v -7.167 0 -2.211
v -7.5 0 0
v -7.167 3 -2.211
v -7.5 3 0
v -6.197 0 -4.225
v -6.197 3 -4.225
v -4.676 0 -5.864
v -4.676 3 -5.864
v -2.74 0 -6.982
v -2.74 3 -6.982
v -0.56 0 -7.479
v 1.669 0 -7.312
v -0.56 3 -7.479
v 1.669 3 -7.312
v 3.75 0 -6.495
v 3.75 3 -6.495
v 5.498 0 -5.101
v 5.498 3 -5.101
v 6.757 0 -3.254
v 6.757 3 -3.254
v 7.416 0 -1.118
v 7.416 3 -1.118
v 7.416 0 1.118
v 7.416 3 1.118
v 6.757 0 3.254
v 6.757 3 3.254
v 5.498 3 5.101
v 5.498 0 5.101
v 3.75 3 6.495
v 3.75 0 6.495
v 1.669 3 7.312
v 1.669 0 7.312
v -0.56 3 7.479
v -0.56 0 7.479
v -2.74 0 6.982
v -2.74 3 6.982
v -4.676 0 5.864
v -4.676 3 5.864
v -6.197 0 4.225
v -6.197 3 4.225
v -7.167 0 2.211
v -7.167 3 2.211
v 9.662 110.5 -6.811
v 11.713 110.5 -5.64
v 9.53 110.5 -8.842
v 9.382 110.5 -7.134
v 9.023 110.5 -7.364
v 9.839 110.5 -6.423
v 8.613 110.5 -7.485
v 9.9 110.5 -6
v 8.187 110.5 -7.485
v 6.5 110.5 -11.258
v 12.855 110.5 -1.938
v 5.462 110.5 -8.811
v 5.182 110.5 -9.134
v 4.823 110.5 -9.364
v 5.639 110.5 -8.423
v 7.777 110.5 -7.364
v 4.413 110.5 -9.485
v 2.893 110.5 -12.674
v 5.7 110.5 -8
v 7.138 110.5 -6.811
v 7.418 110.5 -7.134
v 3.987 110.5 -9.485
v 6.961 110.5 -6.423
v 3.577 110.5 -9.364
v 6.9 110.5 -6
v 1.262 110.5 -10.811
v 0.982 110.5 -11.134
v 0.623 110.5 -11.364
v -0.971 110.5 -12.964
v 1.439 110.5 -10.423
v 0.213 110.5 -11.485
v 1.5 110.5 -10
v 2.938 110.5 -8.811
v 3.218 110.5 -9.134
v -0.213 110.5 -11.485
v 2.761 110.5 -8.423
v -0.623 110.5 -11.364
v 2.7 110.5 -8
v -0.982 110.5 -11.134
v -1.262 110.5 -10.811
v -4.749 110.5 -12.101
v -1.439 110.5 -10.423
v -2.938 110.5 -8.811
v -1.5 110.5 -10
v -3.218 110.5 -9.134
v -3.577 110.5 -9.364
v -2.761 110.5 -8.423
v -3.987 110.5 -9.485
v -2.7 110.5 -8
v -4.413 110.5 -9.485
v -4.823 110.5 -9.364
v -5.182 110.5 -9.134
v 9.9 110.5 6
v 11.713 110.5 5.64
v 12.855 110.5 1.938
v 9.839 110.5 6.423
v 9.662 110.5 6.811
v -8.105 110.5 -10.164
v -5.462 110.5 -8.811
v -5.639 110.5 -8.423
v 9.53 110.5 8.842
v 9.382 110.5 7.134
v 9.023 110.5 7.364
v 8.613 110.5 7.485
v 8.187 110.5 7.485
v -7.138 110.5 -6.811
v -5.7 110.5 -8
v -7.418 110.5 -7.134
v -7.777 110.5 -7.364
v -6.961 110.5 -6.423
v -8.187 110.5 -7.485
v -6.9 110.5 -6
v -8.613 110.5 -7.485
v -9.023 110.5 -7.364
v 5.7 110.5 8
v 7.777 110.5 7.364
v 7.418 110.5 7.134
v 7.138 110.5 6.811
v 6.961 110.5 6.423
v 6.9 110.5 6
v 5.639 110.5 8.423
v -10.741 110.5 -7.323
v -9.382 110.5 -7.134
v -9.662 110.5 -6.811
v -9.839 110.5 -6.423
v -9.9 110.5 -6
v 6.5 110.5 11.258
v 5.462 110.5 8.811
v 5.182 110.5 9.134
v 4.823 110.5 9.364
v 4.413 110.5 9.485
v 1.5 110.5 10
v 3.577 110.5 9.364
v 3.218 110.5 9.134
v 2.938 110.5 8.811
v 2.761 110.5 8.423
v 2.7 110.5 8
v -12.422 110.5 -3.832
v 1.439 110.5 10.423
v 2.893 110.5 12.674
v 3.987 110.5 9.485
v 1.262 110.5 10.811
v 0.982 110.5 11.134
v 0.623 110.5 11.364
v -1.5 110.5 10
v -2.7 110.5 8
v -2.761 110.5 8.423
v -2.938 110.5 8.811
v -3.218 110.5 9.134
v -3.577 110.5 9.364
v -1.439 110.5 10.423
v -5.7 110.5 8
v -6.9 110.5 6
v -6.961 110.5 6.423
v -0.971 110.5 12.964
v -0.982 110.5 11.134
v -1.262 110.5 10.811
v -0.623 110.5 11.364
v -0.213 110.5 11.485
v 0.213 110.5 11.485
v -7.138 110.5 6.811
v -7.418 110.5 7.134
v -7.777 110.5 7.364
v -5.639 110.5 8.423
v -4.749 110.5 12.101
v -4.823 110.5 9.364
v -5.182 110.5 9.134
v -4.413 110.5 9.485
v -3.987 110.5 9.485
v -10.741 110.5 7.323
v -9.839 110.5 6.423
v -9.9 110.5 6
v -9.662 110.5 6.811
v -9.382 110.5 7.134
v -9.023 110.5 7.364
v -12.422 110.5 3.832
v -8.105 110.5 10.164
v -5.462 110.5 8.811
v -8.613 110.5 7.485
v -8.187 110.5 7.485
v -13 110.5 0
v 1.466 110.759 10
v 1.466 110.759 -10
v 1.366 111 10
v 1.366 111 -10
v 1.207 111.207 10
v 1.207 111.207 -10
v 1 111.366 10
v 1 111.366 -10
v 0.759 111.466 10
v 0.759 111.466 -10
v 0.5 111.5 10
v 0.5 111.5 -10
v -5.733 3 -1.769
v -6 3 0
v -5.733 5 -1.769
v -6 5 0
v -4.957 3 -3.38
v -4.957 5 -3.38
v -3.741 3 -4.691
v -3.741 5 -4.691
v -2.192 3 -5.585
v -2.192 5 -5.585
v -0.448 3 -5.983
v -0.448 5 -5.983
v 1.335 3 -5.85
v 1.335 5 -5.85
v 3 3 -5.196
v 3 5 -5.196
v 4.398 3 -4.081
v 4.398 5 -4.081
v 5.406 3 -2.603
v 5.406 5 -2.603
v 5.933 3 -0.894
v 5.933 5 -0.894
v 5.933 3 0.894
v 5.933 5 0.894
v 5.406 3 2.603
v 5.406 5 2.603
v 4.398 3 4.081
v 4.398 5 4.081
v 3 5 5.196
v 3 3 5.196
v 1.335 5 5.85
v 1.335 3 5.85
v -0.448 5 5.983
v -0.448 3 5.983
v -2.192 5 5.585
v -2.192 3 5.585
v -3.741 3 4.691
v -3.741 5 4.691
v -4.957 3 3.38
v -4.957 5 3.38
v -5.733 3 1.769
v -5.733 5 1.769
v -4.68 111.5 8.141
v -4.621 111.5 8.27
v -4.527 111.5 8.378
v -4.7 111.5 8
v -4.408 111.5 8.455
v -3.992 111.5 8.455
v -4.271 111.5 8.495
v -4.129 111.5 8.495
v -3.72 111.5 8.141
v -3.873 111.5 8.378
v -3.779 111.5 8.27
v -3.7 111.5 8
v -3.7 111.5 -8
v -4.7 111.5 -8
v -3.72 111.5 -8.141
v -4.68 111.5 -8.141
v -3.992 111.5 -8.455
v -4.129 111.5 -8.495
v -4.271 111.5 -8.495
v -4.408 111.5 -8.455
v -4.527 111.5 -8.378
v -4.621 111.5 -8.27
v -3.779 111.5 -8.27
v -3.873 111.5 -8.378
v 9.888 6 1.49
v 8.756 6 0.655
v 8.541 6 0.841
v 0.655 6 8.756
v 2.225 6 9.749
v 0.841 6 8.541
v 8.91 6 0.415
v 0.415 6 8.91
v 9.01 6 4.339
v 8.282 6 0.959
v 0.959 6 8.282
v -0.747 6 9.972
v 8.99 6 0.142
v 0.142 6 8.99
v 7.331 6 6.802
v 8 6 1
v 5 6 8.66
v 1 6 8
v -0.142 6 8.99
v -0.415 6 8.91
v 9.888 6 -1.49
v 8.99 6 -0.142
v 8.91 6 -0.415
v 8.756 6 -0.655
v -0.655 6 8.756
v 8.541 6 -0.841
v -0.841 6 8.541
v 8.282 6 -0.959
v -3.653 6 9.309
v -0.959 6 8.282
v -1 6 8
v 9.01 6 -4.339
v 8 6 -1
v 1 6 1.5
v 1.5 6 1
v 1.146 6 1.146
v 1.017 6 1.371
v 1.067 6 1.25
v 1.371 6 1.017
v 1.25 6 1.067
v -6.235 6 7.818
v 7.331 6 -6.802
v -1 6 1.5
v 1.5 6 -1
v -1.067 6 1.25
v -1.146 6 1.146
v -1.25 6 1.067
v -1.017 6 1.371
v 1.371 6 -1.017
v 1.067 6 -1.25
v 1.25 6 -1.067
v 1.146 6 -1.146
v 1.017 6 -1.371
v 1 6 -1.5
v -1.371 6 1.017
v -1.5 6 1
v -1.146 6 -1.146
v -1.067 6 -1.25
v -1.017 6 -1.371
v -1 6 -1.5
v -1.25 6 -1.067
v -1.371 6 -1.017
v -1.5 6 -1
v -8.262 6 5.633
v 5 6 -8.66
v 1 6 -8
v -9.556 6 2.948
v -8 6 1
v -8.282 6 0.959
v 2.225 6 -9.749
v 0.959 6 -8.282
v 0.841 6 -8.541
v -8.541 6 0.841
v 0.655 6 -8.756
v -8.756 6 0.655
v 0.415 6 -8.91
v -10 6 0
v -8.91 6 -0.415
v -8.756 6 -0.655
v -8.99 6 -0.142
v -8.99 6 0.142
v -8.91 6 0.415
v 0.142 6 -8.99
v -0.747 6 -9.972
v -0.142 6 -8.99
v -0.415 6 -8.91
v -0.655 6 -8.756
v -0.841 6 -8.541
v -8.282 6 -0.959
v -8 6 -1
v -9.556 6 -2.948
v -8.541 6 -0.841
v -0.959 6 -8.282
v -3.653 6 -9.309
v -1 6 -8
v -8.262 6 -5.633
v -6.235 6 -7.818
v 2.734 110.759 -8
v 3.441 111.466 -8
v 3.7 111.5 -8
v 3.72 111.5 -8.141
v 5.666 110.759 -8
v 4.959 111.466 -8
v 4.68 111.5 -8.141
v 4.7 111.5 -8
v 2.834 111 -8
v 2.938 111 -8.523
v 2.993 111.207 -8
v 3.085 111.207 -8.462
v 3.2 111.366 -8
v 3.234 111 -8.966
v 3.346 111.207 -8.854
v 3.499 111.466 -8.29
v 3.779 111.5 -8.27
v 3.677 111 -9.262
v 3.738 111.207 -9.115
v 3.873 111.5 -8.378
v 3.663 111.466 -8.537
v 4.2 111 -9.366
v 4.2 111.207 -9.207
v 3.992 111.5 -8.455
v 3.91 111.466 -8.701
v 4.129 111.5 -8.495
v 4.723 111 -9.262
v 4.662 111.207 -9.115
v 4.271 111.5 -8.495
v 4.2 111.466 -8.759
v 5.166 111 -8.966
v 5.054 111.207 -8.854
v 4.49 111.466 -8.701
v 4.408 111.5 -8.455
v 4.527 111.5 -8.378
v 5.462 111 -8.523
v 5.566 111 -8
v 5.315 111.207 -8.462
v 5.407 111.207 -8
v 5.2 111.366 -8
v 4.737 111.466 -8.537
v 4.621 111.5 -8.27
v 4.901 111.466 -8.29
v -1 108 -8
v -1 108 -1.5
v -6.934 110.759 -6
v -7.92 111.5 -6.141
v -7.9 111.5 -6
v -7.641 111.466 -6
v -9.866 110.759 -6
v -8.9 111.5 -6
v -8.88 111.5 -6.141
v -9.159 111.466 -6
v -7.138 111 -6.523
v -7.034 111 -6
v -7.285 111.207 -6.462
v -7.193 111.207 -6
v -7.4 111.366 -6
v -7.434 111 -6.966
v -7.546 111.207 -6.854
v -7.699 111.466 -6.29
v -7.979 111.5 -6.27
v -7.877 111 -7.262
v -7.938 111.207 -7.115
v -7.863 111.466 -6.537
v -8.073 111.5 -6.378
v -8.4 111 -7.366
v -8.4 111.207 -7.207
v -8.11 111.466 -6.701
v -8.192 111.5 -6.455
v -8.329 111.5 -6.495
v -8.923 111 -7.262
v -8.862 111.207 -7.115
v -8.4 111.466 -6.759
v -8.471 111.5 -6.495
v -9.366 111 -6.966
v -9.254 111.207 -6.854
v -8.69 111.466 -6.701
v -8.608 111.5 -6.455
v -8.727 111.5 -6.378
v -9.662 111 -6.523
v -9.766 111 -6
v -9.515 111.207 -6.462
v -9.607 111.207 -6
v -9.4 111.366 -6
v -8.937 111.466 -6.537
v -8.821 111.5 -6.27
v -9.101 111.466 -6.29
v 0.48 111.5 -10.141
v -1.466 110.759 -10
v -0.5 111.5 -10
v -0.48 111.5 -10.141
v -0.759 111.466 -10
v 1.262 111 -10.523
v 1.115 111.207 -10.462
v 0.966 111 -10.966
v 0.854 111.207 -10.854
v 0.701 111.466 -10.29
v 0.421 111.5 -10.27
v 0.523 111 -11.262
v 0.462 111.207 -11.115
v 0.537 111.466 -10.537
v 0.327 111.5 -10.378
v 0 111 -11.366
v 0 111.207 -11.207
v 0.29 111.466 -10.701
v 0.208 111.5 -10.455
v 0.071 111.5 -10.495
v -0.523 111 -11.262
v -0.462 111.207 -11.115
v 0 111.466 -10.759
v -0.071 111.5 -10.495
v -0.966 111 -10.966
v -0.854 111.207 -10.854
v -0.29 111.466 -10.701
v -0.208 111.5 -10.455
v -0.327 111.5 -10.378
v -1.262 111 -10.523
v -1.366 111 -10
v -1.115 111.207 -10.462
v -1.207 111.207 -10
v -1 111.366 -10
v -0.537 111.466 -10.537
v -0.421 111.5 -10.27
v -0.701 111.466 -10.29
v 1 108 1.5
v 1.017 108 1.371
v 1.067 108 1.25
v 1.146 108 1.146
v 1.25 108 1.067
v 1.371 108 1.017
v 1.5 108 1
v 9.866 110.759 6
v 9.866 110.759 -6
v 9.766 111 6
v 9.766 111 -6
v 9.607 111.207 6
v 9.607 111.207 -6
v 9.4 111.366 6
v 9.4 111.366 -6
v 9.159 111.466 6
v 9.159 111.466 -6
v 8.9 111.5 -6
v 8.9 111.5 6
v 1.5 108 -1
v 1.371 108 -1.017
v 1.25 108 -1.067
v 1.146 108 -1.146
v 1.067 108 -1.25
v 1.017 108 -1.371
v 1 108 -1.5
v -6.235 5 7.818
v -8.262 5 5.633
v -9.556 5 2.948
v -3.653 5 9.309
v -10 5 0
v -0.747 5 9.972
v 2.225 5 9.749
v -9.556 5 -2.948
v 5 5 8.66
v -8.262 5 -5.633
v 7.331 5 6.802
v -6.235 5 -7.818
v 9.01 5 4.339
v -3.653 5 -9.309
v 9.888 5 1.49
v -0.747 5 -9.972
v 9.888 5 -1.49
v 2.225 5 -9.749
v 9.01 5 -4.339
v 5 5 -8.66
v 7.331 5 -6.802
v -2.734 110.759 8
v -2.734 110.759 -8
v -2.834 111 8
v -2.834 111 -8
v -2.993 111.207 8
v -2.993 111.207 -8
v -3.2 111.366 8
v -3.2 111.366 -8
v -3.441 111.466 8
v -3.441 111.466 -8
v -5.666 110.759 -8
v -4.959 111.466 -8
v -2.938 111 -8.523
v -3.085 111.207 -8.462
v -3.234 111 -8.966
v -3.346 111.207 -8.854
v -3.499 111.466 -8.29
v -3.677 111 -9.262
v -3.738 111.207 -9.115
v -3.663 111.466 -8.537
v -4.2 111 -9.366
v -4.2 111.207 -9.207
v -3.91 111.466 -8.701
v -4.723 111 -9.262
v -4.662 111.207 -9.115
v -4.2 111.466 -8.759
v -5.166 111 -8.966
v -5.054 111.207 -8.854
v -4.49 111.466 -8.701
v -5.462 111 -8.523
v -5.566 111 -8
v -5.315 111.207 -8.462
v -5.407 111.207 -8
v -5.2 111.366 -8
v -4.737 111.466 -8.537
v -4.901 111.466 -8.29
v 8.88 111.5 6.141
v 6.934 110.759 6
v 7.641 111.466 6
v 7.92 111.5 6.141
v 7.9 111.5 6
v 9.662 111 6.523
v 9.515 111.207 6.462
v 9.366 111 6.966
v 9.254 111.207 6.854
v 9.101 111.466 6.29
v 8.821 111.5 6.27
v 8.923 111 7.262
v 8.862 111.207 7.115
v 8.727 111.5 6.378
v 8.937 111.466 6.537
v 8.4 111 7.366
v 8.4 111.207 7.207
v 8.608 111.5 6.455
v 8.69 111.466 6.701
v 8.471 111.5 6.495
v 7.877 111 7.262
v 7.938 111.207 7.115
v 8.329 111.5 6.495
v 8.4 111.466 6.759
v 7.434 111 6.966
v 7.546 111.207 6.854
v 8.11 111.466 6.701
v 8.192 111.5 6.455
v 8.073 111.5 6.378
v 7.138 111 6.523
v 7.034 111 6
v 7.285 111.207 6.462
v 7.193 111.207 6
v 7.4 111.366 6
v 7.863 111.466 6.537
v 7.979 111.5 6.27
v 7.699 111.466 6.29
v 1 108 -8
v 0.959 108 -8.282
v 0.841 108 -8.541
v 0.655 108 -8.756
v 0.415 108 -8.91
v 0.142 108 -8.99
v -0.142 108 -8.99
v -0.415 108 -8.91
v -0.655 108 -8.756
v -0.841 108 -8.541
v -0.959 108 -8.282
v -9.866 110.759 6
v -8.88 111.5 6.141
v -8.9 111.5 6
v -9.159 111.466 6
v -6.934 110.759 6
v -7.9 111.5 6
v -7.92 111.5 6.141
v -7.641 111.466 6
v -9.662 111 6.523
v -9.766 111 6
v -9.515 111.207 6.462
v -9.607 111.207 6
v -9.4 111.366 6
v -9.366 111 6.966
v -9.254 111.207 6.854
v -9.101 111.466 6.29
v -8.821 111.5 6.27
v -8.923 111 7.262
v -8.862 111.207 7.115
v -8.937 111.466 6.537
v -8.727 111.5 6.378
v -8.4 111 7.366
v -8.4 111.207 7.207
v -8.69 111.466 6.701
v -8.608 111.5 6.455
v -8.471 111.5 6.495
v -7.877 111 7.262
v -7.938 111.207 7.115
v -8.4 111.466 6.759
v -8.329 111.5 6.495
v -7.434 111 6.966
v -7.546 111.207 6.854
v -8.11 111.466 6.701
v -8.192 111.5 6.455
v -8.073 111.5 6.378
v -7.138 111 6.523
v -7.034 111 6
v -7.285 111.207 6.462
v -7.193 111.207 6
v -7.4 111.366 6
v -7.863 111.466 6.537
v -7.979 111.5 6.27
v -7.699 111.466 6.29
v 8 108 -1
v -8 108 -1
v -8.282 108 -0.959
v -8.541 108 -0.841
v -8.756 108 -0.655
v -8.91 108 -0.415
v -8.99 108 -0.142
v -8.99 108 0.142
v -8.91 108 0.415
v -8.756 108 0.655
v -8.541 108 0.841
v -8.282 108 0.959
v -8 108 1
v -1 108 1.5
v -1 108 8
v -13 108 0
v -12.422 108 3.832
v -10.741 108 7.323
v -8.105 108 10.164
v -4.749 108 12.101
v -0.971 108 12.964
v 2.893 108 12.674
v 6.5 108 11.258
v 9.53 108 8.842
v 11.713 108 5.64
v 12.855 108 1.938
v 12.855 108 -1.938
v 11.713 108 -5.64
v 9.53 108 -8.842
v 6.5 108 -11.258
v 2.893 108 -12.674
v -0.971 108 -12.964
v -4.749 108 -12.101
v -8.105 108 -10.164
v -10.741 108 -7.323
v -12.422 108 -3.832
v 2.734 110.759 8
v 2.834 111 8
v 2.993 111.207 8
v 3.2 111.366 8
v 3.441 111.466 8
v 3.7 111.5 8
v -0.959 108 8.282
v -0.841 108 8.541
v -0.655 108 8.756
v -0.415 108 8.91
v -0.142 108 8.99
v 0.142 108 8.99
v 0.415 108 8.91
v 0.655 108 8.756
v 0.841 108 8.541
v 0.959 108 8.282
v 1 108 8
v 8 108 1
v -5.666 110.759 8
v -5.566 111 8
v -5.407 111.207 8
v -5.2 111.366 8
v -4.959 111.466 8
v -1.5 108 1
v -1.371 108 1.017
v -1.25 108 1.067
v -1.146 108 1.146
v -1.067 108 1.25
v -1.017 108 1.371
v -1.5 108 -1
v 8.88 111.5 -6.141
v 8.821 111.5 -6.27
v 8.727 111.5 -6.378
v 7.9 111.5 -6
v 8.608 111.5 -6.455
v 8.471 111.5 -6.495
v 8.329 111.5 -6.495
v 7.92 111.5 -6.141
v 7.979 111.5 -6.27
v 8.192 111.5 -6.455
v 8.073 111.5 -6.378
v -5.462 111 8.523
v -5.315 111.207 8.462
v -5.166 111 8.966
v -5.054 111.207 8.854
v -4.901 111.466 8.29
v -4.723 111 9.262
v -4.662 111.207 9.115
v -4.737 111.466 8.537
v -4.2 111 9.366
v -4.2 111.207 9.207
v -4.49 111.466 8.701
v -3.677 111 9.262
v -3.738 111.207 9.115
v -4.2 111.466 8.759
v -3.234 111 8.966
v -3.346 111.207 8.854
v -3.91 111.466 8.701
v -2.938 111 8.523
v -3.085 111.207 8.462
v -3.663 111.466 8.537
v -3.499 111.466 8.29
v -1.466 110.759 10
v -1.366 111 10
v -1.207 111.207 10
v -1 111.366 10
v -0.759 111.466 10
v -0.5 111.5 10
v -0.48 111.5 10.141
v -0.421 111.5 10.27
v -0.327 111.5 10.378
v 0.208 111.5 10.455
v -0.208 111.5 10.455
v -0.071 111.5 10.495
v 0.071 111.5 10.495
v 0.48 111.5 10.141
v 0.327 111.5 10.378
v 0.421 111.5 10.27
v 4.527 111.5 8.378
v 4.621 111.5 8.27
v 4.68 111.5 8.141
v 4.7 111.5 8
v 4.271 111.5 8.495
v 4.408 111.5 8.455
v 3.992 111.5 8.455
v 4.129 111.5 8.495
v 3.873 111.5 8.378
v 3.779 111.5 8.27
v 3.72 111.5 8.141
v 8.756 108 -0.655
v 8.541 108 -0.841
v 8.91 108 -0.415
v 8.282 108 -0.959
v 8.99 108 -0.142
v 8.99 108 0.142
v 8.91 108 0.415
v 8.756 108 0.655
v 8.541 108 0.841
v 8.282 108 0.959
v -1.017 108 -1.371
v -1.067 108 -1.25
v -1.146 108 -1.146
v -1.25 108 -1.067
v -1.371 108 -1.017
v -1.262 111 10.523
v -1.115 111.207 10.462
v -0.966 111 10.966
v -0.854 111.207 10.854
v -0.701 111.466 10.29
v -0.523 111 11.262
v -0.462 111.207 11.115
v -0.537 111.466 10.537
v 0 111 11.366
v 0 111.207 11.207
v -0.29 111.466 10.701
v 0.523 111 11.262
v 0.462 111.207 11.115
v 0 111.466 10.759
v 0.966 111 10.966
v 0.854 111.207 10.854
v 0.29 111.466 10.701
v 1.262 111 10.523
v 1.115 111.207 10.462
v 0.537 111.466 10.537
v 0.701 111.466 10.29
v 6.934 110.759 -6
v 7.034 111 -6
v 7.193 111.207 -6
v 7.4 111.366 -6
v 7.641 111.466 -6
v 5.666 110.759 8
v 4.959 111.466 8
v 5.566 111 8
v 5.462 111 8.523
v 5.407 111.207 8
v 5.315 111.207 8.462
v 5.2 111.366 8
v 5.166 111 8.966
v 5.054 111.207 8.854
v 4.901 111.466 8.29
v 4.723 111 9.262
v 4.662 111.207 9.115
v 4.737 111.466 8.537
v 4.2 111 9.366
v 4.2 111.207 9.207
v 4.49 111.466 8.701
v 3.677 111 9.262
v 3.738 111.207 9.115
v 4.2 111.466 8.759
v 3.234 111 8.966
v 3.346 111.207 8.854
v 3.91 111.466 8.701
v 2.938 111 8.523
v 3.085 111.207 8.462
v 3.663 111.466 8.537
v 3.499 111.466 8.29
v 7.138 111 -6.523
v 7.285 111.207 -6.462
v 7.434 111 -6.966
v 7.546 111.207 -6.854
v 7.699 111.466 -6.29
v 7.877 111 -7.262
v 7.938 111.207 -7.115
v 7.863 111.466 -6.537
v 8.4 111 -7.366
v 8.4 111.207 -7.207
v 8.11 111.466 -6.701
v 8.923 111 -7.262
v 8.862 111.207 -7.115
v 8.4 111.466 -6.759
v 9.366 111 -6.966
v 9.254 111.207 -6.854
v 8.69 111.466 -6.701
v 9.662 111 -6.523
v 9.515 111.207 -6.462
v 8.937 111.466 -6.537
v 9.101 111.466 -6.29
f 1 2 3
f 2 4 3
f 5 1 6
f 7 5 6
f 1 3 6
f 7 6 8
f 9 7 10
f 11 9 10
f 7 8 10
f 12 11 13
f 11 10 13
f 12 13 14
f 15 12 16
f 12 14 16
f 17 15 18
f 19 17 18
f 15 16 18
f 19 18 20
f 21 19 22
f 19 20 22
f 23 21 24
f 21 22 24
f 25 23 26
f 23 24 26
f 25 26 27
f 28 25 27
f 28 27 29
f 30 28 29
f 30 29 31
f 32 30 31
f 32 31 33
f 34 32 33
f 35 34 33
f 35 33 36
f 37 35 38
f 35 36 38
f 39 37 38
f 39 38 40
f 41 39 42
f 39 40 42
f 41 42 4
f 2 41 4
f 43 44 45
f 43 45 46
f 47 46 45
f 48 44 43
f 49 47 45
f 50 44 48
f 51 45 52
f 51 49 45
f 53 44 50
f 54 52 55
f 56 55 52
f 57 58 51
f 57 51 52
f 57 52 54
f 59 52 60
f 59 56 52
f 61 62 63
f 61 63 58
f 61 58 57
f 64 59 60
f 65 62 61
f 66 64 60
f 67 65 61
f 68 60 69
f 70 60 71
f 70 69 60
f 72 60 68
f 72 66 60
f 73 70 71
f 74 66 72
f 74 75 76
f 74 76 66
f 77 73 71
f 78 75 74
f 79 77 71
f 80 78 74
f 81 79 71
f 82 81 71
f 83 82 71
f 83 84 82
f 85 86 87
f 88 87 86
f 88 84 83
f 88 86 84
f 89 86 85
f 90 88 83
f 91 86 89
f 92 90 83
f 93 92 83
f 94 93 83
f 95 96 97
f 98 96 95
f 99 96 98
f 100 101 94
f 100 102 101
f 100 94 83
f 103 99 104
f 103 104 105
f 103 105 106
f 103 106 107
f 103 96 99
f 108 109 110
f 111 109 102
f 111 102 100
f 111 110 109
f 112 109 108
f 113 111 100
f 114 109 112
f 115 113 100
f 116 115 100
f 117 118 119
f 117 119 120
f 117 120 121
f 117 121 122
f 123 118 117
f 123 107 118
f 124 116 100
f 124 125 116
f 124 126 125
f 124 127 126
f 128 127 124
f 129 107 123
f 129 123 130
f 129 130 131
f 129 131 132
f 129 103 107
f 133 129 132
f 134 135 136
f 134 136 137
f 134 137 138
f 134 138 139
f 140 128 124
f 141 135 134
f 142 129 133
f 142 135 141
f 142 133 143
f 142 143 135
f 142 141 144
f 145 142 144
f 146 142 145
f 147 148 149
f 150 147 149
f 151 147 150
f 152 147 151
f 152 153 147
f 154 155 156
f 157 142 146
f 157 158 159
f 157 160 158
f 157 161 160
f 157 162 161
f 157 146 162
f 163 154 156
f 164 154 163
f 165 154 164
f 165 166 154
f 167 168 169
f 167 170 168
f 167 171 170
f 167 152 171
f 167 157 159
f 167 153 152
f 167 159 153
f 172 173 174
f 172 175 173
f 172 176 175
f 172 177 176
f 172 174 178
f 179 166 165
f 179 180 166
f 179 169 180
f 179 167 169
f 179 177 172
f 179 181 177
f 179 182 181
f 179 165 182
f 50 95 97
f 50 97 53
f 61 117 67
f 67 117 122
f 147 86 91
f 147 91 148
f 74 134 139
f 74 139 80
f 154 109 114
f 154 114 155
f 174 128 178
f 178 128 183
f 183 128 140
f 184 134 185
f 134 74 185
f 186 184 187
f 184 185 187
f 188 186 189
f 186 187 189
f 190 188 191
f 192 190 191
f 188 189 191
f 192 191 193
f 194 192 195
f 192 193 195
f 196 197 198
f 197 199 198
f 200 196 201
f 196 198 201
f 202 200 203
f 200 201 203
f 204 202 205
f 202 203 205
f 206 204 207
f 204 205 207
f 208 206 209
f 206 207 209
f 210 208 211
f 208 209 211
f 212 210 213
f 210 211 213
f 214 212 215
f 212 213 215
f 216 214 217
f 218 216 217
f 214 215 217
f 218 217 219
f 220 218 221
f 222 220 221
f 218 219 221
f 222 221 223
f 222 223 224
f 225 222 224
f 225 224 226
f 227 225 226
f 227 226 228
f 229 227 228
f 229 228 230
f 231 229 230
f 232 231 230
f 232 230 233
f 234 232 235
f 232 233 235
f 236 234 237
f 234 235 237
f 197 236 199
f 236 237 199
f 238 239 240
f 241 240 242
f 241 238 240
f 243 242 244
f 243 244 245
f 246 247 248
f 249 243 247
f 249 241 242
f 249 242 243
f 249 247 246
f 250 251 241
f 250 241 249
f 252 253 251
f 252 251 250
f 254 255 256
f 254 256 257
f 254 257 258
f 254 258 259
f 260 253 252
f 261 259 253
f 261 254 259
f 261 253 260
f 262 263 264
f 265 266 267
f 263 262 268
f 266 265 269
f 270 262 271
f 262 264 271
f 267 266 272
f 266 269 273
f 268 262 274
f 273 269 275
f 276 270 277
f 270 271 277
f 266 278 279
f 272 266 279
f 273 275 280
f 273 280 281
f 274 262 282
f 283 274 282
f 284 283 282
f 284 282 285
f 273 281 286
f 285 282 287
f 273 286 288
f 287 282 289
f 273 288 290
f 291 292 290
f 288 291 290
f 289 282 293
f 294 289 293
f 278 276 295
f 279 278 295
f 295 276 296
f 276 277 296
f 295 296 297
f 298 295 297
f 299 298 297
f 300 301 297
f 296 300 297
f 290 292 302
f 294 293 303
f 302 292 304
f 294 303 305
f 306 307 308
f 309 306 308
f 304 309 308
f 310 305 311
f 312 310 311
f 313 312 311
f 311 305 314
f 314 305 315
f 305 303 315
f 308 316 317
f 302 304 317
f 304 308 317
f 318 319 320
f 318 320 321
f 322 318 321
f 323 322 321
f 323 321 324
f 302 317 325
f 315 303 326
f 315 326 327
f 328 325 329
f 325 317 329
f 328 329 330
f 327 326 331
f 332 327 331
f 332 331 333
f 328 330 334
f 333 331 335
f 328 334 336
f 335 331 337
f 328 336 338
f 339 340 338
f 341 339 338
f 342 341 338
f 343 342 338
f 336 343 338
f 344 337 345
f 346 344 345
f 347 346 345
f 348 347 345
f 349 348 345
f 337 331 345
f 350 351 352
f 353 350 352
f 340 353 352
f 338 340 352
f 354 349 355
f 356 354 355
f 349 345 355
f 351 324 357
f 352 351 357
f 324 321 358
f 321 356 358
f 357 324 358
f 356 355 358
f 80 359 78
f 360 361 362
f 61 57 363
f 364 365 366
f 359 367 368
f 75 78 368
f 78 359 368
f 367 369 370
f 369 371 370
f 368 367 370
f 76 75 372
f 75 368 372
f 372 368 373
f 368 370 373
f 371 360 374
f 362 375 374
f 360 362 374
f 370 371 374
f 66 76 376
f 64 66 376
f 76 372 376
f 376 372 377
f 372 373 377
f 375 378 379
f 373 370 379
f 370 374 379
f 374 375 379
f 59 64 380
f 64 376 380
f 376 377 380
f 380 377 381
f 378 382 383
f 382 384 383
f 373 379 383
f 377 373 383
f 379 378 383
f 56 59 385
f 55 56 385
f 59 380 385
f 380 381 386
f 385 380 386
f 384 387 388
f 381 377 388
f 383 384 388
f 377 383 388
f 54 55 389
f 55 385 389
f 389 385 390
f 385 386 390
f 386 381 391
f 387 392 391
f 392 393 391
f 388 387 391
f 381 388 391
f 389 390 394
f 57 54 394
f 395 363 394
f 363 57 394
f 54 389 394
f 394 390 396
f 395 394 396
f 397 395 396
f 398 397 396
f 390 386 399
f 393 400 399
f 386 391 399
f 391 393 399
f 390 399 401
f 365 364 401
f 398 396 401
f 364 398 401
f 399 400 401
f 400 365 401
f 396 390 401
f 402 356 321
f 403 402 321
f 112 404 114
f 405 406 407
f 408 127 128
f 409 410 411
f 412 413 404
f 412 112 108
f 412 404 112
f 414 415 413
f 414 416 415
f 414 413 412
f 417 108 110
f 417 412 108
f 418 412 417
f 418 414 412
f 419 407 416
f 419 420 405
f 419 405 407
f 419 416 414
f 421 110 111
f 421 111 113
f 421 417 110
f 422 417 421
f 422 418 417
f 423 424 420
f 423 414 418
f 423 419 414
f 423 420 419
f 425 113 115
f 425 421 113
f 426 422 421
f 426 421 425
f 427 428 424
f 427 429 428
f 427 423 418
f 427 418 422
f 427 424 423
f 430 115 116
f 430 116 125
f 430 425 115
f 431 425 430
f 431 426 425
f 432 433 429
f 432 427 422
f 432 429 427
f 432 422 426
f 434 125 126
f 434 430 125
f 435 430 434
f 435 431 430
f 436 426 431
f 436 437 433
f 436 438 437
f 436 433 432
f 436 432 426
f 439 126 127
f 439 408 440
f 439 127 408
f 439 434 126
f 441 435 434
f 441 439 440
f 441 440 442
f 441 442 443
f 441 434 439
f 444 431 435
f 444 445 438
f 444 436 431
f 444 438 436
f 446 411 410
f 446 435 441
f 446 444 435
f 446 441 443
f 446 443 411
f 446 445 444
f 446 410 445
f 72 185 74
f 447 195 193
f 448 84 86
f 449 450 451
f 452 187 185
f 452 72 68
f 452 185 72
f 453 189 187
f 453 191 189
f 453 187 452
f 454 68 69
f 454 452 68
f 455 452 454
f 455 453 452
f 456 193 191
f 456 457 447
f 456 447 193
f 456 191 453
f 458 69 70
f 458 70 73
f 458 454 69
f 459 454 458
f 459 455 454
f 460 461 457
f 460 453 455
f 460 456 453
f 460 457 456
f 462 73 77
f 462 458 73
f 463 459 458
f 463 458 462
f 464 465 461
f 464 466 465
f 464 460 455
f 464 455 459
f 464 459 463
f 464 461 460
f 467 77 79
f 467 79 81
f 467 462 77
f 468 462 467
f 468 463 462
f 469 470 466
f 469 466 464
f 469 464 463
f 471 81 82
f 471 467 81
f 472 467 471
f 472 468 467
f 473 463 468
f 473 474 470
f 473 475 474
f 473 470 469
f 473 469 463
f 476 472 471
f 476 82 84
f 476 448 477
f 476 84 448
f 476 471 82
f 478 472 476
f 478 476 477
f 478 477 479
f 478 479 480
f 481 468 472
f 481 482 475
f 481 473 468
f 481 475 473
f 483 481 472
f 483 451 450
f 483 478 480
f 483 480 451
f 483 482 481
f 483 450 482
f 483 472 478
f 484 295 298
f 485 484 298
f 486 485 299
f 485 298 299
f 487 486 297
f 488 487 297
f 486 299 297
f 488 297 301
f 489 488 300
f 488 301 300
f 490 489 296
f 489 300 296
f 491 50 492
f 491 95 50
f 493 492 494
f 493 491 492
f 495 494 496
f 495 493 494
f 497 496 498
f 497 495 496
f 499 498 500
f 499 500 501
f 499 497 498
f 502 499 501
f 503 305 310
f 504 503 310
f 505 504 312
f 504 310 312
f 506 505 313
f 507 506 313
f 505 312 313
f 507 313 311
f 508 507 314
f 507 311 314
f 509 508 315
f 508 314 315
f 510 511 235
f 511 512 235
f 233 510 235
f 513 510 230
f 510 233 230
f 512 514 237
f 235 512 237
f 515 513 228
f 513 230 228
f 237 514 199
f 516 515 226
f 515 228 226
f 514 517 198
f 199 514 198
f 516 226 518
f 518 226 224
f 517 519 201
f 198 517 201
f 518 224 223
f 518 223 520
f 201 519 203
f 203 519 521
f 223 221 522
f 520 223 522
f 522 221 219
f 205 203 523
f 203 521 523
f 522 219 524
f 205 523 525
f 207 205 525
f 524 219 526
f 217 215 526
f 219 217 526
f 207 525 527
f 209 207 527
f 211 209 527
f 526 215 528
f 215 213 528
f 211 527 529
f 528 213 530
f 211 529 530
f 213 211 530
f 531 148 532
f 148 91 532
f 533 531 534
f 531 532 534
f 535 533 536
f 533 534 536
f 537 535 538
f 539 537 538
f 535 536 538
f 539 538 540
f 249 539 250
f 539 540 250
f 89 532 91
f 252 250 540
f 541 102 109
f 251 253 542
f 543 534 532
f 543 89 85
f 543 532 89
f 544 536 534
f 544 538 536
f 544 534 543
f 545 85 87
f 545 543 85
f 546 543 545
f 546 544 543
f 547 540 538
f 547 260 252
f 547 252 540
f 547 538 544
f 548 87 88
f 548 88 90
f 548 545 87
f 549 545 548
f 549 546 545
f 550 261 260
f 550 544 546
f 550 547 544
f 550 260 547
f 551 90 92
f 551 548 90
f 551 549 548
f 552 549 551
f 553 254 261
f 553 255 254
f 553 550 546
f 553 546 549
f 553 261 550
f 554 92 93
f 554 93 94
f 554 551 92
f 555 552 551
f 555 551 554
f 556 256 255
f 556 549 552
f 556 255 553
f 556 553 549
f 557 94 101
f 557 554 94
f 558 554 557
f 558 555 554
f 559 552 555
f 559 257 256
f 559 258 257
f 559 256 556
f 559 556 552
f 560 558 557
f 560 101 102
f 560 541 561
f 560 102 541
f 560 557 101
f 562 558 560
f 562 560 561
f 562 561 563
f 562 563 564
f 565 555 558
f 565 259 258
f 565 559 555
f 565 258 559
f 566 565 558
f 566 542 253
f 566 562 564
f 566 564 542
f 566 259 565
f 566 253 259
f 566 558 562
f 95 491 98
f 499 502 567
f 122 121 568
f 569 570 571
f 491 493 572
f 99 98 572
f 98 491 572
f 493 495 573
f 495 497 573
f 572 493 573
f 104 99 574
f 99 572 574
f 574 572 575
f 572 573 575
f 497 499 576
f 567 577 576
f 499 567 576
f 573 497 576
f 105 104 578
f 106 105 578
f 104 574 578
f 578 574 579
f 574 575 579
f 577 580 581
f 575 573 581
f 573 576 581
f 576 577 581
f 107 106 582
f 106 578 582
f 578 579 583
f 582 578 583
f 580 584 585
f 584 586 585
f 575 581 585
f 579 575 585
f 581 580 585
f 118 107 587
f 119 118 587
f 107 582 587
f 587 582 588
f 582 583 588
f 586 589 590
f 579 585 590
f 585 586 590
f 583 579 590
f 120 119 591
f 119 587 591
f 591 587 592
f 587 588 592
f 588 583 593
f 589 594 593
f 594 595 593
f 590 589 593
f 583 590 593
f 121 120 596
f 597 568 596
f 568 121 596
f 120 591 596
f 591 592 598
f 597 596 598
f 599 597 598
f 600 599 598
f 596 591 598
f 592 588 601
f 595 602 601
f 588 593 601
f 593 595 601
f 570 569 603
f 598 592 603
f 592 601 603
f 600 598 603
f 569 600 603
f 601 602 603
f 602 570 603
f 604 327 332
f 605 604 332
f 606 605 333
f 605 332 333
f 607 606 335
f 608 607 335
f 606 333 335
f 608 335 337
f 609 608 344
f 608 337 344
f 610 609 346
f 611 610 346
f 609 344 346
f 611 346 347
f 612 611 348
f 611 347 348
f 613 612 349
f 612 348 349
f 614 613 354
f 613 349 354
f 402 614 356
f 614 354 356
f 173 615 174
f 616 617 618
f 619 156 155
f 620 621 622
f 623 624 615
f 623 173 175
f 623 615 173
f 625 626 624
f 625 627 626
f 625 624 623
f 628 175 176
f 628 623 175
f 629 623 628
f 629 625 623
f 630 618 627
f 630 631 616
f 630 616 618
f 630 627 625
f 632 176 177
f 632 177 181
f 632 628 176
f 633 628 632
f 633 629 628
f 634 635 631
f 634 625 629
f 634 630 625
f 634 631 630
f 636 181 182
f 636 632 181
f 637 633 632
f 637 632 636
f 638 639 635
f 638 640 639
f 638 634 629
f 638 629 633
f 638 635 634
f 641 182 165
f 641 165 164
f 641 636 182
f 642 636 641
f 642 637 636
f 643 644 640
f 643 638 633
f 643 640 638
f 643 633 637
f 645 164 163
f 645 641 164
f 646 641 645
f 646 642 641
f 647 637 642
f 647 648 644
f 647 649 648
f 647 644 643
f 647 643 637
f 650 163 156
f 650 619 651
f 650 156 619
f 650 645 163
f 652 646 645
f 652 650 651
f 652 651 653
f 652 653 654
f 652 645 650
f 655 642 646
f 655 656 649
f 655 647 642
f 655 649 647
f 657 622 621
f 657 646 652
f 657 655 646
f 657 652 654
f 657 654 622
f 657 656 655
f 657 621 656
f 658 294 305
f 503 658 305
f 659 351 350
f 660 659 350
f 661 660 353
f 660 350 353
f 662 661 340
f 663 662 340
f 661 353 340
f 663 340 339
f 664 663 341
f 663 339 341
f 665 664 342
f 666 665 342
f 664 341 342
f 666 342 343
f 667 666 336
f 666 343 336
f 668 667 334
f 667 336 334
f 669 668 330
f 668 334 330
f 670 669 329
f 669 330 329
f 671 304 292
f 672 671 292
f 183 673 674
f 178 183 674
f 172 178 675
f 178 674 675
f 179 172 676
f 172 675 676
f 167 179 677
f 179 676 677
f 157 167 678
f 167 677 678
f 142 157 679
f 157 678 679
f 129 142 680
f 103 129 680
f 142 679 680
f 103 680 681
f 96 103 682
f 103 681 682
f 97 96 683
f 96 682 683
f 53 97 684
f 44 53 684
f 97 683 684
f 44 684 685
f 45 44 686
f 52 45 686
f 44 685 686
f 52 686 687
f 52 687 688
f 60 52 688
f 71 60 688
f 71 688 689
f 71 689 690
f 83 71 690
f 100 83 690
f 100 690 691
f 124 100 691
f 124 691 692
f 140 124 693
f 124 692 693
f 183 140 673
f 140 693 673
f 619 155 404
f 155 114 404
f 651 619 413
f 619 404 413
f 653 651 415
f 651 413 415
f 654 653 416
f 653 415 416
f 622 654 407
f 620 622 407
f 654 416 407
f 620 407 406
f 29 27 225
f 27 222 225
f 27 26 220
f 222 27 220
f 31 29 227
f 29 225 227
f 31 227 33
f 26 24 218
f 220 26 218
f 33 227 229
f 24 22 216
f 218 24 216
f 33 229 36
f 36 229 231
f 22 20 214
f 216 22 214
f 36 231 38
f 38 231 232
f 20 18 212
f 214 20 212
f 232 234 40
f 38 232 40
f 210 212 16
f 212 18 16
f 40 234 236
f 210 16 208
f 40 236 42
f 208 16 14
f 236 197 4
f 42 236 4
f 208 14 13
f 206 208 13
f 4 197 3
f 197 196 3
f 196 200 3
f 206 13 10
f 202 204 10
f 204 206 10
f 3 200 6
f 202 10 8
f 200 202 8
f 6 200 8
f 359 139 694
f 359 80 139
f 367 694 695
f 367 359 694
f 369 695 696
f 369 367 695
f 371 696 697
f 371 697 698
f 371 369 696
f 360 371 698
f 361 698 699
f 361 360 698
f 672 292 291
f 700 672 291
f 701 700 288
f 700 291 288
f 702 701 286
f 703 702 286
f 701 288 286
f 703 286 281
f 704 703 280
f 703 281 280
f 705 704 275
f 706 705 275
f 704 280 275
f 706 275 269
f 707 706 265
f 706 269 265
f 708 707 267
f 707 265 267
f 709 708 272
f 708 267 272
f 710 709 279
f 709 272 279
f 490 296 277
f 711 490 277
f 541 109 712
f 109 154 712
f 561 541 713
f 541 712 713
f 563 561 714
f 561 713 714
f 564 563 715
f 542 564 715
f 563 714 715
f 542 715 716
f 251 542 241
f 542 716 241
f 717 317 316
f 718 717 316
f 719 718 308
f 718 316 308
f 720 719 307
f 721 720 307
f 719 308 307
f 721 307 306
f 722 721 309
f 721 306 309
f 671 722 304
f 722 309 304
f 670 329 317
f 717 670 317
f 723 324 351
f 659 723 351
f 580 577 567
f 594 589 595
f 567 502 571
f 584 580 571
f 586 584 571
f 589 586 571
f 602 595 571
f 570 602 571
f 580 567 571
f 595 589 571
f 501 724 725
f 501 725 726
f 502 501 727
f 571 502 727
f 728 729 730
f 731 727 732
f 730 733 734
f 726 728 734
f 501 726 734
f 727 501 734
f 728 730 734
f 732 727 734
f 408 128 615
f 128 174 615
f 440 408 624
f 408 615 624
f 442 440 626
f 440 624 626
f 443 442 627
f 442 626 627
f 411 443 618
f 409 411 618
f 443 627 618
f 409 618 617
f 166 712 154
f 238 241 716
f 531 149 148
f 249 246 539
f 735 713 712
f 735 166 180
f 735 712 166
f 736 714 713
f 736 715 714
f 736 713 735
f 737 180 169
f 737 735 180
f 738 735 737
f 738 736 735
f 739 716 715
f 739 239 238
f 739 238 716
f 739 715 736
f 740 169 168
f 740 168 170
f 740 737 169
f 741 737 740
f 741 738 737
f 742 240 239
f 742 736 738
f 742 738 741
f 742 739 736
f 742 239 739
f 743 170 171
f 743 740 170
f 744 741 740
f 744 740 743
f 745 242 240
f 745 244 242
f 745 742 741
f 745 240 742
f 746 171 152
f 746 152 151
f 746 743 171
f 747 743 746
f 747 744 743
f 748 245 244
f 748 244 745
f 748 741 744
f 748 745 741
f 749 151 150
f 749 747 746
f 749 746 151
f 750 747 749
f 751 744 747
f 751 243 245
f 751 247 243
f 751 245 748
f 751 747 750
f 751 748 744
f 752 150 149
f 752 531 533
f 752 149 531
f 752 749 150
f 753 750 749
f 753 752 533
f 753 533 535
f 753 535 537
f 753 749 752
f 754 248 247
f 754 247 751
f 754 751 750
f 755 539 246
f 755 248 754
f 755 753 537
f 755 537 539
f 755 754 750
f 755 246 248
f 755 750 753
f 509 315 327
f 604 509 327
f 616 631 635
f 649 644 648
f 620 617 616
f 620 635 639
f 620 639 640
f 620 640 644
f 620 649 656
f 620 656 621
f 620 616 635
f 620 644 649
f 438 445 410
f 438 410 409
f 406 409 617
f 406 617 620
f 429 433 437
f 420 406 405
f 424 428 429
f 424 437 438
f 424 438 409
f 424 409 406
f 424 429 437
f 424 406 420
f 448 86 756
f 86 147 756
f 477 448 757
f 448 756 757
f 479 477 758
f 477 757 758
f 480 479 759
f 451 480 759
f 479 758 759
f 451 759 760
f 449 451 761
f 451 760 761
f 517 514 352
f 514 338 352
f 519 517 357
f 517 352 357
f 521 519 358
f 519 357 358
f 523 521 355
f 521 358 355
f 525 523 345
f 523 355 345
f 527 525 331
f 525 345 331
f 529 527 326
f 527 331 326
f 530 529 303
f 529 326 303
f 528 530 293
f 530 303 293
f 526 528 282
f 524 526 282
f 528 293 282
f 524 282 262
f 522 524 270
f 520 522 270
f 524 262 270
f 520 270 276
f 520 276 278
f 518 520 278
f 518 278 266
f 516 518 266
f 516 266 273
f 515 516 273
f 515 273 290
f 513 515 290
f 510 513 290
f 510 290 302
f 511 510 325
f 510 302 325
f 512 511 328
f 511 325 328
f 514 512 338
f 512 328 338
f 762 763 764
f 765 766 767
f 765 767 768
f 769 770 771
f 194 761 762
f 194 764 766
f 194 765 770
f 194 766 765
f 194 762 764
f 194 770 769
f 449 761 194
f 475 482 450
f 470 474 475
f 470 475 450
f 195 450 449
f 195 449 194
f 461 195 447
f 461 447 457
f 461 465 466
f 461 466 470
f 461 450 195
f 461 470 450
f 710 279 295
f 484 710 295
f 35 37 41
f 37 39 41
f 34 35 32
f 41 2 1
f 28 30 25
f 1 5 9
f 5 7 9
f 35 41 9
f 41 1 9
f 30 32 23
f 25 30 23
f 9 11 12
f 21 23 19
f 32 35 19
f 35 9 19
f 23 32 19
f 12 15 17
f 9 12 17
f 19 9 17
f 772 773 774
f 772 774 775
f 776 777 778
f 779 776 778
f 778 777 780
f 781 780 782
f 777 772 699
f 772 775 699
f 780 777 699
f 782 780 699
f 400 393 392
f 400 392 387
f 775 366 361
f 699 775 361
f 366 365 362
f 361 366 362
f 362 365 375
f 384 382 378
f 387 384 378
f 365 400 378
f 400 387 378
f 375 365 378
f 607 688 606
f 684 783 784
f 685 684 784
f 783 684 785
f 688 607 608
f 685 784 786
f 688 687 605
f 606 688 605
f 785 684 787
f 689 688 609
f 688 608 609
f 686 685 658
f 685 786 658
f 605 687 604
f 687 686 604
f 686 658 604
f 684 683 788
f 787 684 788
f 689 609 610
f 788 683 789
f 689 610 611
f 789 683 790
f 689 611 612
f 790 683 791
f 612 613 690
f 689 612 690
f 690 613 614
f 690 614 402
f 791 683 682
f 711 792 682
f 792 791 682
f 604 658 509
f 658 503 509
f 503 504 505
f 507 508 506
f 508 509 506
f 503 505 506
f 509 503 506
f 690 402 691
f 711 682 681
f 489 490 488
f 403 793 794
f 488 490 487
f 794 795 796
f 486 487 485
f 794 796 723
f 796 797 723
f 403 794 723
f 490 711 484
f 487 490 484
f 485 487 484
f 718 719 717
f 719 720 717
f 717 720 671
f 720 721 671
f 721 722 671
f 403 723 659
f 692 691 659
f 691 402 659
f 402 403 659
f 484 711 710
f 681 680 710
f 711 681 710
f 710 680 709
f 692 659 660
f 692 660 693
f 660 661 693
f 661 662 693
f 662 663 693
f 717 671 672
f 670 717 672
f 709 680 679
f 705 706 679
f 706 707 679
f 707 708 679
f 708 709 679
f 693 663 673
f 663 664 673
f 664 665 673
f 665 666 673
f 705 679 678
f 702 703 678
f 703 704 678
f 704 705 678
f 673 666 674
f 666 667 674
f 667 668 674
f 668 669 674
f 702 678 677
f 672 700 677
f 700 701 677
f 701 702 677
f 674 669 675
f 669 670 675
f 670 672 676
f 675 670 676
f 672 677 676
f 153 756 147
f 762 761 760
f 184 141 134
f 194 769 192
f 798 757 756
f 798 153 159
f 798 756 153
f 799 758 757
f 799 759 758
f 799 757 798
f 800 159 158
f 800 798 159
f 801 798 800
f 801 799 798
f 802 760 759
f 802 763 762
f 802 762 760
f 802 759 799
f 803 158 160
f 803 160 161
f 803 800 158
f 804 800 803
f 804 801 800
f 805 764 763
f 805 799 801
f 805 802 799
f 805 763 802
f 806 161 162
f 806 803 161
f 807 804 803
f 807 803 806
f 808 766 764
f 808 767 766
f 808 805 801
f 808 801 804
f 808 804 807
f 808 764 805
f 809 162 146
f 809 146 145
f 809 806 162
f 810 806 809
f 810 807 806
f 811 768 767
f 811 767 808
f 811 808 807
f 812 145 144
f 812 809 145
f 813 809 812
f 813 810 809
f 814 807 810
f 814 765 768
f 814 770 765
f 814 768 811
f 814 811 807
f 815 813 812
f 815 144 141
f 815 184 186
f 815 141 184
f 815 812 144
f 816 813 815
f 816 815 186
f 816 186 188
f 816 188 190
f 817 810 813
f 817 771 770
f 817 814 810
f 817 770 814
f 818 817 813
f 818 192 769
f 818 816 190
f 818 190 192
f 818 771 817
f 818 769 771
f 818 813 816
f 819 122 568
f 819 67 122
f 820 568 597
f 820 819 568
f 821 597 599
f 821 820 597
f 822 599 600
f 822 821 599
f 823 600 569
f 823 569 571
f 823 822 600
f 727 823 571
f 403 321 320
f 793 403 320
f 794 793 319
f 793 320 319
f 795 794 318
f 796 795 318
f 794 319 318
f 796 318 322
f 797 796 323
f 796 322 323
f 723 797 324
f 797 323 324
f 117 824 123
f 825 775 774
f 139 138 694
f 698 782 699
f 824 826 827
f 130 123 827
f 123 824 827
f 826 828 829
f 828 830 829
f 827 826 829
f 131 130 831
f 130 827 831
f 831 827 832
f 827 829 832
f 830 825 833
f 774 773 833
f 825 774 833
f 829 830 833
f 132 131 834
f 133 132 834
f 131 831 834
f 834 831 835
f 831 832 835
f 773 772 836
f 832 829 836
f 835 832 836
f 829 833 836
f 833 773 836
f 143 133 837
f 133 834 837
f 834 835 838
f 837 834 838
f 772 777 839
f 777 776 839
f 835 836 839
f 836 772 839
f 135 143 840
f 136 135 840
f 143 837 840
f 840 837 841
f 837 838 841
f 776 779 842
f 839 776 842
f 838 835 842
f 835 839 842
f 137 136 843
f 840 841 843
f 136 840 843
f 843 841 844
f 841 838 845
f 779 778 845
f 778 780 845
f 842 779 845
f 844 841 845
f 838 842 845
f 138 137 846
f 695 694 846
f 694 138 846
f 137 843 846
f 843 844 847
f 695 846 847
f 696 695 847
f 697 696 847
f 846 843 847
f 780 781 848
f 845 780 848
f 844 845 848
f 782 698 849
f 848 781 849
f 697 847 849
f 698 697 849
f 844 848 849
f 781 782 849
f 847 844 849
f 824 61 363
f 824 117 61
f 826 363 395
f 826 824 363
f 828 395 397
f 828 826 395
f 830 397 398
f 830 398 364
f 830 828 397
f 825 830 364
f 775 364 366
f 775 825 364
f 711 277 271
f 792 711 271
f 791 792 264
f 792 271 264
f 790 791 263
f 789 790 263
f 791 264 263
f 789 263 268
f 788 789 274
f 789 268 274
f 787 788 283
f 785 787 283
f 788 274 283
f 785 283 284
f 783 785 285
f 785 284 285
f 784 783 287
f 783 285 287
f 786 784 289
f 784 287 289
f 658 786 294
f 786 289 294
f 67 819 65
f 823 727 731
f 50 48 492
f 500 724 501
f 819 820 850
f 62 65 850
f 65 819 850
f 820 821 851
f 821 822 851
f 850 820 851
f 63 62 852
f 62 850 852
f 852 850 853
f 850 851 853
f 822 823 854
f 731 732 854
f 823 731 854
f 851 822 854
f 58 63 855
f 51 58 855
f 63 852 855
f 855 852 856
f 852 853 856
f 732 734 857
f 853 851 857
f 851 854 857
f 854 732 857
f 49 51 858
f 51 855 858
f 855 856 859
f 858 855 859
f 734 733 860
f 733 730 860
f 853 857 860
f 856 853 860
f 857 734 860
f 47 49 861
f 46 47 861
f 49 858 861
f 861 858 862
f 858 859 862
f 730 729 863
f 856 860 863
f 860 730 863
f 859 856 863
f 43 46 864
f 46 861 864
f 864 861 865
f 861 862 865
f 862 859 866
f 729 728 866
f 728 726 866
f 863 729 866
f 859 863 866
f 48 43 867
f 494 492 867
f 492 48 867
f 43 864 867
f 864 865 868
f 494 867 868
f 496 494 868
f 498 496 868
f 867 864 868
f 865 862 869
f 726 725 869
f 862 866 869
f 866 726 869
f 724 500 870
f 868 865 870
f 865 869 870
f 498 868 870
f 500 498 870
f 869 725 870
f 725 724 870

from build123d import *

# Parameters (mm, degrees)
BOSS_EXTRUDE1_DEPTH = 102
SKETCH3_R           = 13
BOSS_EXTRUDE2_DEPTH = 2.5
BOSS_EXTRUDE3_DEPTH = 1
FILLET1_R           = 1


with BuildPart() as part:
    # Sketch1 → Revolve1 (revolve)
    with BuildSketch(Plane.XY, mode=Mode.PRIVATE) as revolve1_sk:
        Polygon((0, 0), (7.5, 0), (7.5, 3), (6, 3), (6, 5), (10, 5), (10, 6), (0, 6), align=None)
    revolve(revolve1_sk.sketch.rotate(Axis((0, 6, 0), (0, -1, 0)), 180), axis=Axis((0, 6, 0), (0, -1, 0)))

    # Sketch2 → Boss-Extrude1 (add)
    with BuildSketch(Plane(origin=(0, 6, 0), x_dir=(1, 0, 0), z_dir=(0, 1, 0))):
        with BuildLine():
            Line((-1, 8), (-1, 1.5))
            ThreePointArc((-1, 1.5), (-1.146446609, 1.146446609), (-1.5, 1))
            Line((-1.5, 1), (-8, 1))
            ThreePointArc((-8, 1), (-9, 0), (-8, -1))
            Line((-8, -1), (-1.5, -1))
            ThreePointArc((-1.5, -1), (-1.146446609, -1.146446609), (-1, -1.5))
            Line((-1, -1.5), (-1, -8))
            ThreePointArc((-1, -8), (0, -9), (1, -8))
            Line((1, -8), (1, -1.5))
            ThreePointArc((1, -1.5), (1.146446609, -1.146446609), (1.5, -1))
            Line((1.5, -1), (8, -1))
            ThreePointArc((8, -1), (9, 0), (8, 1))
            Line((8, 1), (1.5, 1))
            ThreePointArc((1.5, 1), (1.146446609, 1.146446609), (1, 1.5))
            Line((1, 1.5), (1, 8))
            ThreePointArc((1, 8), (0, 9), (-1, 8))
        make_face()
    extrude(amount=BOSS_EXTRUDE1_DEPTH)

    # Sketch3 → Boss-Extrude2 (add)
    with BuildSketch(Plane(origin=(0, 108, 0), x_dir=(1, 0, 0), z_dir=(0, 1, 0))):
        with Locations(Location((0, 0, 0), (0, 0, 180))):
            Circle(SKETCH3_R)
    extrude(amount=BOSS_EXTRUDE2_DEPTH)

    # Sketch4 → Boss-Extrude3 (add)
    with BuildSketch(Plane(origin=(0, 110.5, 0), x_dir=(1, 0, 0), z_dir=(0, 1, 0))):
        with BuildLine():
            Line((-1.5, 10), (-1.5, -10))
            ThreePointArc((-1.5, -10), (0, -11.5), (1.5, -10))
            Line((1.5, -10), (1.5, 10))
            ThreePointArc((1.5, 10), (0, 11.5), (-1.5, 10))
        make_face()
        with BuildLine():
            Line((-5.7, 8), (-5.7, -8))
            ThreePointArc((-5.7, -8), (-4.2, -9.5), (-2.7, -8))
            Line((-2.7, -8), (-2.7, 8))
            ThreePointArc((-2.7, 8), (-4.2, 9.5), (-5.7, 8))
        make_face()
        with BuildLine():
            Line((-9.9, 6), (-9.9, -6))
            ThreePointArc((-9.9, -6), (-8.4, -7.5), (-6.9, -6))
            Line((-6.9, -6), (-6.9, 6))
            ThreePointArc((-6.9, 6), (-8.4, 7.5), (-9.9, 6))
        make_face()
        with BuildLine():
            Line((9.9, 6), (9.9, -6))
            ThreePointArc((9.9, -6), (8.4, -7.5), (6.9, -6))
            Line((6.9, -6), (6.9, 6))
            ThreePointArc((6.9, 6), (8.4, 7.5), (9.9, 6))
        make_face()
        with BuildLine():
            Line((5.7, 8), (5.7, -8))
            ThreePointArc((5.7, -8), (4.2, -9.5), (2.7, -8))
            Line((2.7, -8), (2.7, 8))
            ThreePointArc((2.7, 8), (4.2, 9.5), (5.7, 8))
        make_face()
    extrude(amount=BOSS_EXTRUDE3_DEPTH)

    # Fillet1
    fillet1_edges = [part.edges().sort_by_distance(p)[0] for p in [
        (9.9, 111.5, 0),
        (8.4, 111.5, 7.5),
        (6.9, 111.5, 0),
        (8.4, 111.5, -7.5),
        (5.7, 111.5, 0),
        (4.2, 111.5, 9.5),
        (2.7, 111.5, 0),
        (4.2, 111.5, -9.5),
        (1.5, 111.5, 0),
        (0, 111.5, 11.5),
        (-1.5, 111.5, 0),
        (0, 111.5, -11.5),
        (-2.7, 111.5, 0),
        (-4.2, 111.5, 9.5),
        (-5.7, 111.5, 0),
        (-4.2, 111.5, -9.5),
        (-6.9, 111.5, 0),
        (-8.4, 111.5, 7.5),
        (-9.9, 111.5, 0),
        (-8.4, 111.5, -7.5),
    ]]
    fillet(fillet1_edges, radius=FILLET1_R - 0.0001)  # a hair under: the kernel refuses the full size


solid = part.part
